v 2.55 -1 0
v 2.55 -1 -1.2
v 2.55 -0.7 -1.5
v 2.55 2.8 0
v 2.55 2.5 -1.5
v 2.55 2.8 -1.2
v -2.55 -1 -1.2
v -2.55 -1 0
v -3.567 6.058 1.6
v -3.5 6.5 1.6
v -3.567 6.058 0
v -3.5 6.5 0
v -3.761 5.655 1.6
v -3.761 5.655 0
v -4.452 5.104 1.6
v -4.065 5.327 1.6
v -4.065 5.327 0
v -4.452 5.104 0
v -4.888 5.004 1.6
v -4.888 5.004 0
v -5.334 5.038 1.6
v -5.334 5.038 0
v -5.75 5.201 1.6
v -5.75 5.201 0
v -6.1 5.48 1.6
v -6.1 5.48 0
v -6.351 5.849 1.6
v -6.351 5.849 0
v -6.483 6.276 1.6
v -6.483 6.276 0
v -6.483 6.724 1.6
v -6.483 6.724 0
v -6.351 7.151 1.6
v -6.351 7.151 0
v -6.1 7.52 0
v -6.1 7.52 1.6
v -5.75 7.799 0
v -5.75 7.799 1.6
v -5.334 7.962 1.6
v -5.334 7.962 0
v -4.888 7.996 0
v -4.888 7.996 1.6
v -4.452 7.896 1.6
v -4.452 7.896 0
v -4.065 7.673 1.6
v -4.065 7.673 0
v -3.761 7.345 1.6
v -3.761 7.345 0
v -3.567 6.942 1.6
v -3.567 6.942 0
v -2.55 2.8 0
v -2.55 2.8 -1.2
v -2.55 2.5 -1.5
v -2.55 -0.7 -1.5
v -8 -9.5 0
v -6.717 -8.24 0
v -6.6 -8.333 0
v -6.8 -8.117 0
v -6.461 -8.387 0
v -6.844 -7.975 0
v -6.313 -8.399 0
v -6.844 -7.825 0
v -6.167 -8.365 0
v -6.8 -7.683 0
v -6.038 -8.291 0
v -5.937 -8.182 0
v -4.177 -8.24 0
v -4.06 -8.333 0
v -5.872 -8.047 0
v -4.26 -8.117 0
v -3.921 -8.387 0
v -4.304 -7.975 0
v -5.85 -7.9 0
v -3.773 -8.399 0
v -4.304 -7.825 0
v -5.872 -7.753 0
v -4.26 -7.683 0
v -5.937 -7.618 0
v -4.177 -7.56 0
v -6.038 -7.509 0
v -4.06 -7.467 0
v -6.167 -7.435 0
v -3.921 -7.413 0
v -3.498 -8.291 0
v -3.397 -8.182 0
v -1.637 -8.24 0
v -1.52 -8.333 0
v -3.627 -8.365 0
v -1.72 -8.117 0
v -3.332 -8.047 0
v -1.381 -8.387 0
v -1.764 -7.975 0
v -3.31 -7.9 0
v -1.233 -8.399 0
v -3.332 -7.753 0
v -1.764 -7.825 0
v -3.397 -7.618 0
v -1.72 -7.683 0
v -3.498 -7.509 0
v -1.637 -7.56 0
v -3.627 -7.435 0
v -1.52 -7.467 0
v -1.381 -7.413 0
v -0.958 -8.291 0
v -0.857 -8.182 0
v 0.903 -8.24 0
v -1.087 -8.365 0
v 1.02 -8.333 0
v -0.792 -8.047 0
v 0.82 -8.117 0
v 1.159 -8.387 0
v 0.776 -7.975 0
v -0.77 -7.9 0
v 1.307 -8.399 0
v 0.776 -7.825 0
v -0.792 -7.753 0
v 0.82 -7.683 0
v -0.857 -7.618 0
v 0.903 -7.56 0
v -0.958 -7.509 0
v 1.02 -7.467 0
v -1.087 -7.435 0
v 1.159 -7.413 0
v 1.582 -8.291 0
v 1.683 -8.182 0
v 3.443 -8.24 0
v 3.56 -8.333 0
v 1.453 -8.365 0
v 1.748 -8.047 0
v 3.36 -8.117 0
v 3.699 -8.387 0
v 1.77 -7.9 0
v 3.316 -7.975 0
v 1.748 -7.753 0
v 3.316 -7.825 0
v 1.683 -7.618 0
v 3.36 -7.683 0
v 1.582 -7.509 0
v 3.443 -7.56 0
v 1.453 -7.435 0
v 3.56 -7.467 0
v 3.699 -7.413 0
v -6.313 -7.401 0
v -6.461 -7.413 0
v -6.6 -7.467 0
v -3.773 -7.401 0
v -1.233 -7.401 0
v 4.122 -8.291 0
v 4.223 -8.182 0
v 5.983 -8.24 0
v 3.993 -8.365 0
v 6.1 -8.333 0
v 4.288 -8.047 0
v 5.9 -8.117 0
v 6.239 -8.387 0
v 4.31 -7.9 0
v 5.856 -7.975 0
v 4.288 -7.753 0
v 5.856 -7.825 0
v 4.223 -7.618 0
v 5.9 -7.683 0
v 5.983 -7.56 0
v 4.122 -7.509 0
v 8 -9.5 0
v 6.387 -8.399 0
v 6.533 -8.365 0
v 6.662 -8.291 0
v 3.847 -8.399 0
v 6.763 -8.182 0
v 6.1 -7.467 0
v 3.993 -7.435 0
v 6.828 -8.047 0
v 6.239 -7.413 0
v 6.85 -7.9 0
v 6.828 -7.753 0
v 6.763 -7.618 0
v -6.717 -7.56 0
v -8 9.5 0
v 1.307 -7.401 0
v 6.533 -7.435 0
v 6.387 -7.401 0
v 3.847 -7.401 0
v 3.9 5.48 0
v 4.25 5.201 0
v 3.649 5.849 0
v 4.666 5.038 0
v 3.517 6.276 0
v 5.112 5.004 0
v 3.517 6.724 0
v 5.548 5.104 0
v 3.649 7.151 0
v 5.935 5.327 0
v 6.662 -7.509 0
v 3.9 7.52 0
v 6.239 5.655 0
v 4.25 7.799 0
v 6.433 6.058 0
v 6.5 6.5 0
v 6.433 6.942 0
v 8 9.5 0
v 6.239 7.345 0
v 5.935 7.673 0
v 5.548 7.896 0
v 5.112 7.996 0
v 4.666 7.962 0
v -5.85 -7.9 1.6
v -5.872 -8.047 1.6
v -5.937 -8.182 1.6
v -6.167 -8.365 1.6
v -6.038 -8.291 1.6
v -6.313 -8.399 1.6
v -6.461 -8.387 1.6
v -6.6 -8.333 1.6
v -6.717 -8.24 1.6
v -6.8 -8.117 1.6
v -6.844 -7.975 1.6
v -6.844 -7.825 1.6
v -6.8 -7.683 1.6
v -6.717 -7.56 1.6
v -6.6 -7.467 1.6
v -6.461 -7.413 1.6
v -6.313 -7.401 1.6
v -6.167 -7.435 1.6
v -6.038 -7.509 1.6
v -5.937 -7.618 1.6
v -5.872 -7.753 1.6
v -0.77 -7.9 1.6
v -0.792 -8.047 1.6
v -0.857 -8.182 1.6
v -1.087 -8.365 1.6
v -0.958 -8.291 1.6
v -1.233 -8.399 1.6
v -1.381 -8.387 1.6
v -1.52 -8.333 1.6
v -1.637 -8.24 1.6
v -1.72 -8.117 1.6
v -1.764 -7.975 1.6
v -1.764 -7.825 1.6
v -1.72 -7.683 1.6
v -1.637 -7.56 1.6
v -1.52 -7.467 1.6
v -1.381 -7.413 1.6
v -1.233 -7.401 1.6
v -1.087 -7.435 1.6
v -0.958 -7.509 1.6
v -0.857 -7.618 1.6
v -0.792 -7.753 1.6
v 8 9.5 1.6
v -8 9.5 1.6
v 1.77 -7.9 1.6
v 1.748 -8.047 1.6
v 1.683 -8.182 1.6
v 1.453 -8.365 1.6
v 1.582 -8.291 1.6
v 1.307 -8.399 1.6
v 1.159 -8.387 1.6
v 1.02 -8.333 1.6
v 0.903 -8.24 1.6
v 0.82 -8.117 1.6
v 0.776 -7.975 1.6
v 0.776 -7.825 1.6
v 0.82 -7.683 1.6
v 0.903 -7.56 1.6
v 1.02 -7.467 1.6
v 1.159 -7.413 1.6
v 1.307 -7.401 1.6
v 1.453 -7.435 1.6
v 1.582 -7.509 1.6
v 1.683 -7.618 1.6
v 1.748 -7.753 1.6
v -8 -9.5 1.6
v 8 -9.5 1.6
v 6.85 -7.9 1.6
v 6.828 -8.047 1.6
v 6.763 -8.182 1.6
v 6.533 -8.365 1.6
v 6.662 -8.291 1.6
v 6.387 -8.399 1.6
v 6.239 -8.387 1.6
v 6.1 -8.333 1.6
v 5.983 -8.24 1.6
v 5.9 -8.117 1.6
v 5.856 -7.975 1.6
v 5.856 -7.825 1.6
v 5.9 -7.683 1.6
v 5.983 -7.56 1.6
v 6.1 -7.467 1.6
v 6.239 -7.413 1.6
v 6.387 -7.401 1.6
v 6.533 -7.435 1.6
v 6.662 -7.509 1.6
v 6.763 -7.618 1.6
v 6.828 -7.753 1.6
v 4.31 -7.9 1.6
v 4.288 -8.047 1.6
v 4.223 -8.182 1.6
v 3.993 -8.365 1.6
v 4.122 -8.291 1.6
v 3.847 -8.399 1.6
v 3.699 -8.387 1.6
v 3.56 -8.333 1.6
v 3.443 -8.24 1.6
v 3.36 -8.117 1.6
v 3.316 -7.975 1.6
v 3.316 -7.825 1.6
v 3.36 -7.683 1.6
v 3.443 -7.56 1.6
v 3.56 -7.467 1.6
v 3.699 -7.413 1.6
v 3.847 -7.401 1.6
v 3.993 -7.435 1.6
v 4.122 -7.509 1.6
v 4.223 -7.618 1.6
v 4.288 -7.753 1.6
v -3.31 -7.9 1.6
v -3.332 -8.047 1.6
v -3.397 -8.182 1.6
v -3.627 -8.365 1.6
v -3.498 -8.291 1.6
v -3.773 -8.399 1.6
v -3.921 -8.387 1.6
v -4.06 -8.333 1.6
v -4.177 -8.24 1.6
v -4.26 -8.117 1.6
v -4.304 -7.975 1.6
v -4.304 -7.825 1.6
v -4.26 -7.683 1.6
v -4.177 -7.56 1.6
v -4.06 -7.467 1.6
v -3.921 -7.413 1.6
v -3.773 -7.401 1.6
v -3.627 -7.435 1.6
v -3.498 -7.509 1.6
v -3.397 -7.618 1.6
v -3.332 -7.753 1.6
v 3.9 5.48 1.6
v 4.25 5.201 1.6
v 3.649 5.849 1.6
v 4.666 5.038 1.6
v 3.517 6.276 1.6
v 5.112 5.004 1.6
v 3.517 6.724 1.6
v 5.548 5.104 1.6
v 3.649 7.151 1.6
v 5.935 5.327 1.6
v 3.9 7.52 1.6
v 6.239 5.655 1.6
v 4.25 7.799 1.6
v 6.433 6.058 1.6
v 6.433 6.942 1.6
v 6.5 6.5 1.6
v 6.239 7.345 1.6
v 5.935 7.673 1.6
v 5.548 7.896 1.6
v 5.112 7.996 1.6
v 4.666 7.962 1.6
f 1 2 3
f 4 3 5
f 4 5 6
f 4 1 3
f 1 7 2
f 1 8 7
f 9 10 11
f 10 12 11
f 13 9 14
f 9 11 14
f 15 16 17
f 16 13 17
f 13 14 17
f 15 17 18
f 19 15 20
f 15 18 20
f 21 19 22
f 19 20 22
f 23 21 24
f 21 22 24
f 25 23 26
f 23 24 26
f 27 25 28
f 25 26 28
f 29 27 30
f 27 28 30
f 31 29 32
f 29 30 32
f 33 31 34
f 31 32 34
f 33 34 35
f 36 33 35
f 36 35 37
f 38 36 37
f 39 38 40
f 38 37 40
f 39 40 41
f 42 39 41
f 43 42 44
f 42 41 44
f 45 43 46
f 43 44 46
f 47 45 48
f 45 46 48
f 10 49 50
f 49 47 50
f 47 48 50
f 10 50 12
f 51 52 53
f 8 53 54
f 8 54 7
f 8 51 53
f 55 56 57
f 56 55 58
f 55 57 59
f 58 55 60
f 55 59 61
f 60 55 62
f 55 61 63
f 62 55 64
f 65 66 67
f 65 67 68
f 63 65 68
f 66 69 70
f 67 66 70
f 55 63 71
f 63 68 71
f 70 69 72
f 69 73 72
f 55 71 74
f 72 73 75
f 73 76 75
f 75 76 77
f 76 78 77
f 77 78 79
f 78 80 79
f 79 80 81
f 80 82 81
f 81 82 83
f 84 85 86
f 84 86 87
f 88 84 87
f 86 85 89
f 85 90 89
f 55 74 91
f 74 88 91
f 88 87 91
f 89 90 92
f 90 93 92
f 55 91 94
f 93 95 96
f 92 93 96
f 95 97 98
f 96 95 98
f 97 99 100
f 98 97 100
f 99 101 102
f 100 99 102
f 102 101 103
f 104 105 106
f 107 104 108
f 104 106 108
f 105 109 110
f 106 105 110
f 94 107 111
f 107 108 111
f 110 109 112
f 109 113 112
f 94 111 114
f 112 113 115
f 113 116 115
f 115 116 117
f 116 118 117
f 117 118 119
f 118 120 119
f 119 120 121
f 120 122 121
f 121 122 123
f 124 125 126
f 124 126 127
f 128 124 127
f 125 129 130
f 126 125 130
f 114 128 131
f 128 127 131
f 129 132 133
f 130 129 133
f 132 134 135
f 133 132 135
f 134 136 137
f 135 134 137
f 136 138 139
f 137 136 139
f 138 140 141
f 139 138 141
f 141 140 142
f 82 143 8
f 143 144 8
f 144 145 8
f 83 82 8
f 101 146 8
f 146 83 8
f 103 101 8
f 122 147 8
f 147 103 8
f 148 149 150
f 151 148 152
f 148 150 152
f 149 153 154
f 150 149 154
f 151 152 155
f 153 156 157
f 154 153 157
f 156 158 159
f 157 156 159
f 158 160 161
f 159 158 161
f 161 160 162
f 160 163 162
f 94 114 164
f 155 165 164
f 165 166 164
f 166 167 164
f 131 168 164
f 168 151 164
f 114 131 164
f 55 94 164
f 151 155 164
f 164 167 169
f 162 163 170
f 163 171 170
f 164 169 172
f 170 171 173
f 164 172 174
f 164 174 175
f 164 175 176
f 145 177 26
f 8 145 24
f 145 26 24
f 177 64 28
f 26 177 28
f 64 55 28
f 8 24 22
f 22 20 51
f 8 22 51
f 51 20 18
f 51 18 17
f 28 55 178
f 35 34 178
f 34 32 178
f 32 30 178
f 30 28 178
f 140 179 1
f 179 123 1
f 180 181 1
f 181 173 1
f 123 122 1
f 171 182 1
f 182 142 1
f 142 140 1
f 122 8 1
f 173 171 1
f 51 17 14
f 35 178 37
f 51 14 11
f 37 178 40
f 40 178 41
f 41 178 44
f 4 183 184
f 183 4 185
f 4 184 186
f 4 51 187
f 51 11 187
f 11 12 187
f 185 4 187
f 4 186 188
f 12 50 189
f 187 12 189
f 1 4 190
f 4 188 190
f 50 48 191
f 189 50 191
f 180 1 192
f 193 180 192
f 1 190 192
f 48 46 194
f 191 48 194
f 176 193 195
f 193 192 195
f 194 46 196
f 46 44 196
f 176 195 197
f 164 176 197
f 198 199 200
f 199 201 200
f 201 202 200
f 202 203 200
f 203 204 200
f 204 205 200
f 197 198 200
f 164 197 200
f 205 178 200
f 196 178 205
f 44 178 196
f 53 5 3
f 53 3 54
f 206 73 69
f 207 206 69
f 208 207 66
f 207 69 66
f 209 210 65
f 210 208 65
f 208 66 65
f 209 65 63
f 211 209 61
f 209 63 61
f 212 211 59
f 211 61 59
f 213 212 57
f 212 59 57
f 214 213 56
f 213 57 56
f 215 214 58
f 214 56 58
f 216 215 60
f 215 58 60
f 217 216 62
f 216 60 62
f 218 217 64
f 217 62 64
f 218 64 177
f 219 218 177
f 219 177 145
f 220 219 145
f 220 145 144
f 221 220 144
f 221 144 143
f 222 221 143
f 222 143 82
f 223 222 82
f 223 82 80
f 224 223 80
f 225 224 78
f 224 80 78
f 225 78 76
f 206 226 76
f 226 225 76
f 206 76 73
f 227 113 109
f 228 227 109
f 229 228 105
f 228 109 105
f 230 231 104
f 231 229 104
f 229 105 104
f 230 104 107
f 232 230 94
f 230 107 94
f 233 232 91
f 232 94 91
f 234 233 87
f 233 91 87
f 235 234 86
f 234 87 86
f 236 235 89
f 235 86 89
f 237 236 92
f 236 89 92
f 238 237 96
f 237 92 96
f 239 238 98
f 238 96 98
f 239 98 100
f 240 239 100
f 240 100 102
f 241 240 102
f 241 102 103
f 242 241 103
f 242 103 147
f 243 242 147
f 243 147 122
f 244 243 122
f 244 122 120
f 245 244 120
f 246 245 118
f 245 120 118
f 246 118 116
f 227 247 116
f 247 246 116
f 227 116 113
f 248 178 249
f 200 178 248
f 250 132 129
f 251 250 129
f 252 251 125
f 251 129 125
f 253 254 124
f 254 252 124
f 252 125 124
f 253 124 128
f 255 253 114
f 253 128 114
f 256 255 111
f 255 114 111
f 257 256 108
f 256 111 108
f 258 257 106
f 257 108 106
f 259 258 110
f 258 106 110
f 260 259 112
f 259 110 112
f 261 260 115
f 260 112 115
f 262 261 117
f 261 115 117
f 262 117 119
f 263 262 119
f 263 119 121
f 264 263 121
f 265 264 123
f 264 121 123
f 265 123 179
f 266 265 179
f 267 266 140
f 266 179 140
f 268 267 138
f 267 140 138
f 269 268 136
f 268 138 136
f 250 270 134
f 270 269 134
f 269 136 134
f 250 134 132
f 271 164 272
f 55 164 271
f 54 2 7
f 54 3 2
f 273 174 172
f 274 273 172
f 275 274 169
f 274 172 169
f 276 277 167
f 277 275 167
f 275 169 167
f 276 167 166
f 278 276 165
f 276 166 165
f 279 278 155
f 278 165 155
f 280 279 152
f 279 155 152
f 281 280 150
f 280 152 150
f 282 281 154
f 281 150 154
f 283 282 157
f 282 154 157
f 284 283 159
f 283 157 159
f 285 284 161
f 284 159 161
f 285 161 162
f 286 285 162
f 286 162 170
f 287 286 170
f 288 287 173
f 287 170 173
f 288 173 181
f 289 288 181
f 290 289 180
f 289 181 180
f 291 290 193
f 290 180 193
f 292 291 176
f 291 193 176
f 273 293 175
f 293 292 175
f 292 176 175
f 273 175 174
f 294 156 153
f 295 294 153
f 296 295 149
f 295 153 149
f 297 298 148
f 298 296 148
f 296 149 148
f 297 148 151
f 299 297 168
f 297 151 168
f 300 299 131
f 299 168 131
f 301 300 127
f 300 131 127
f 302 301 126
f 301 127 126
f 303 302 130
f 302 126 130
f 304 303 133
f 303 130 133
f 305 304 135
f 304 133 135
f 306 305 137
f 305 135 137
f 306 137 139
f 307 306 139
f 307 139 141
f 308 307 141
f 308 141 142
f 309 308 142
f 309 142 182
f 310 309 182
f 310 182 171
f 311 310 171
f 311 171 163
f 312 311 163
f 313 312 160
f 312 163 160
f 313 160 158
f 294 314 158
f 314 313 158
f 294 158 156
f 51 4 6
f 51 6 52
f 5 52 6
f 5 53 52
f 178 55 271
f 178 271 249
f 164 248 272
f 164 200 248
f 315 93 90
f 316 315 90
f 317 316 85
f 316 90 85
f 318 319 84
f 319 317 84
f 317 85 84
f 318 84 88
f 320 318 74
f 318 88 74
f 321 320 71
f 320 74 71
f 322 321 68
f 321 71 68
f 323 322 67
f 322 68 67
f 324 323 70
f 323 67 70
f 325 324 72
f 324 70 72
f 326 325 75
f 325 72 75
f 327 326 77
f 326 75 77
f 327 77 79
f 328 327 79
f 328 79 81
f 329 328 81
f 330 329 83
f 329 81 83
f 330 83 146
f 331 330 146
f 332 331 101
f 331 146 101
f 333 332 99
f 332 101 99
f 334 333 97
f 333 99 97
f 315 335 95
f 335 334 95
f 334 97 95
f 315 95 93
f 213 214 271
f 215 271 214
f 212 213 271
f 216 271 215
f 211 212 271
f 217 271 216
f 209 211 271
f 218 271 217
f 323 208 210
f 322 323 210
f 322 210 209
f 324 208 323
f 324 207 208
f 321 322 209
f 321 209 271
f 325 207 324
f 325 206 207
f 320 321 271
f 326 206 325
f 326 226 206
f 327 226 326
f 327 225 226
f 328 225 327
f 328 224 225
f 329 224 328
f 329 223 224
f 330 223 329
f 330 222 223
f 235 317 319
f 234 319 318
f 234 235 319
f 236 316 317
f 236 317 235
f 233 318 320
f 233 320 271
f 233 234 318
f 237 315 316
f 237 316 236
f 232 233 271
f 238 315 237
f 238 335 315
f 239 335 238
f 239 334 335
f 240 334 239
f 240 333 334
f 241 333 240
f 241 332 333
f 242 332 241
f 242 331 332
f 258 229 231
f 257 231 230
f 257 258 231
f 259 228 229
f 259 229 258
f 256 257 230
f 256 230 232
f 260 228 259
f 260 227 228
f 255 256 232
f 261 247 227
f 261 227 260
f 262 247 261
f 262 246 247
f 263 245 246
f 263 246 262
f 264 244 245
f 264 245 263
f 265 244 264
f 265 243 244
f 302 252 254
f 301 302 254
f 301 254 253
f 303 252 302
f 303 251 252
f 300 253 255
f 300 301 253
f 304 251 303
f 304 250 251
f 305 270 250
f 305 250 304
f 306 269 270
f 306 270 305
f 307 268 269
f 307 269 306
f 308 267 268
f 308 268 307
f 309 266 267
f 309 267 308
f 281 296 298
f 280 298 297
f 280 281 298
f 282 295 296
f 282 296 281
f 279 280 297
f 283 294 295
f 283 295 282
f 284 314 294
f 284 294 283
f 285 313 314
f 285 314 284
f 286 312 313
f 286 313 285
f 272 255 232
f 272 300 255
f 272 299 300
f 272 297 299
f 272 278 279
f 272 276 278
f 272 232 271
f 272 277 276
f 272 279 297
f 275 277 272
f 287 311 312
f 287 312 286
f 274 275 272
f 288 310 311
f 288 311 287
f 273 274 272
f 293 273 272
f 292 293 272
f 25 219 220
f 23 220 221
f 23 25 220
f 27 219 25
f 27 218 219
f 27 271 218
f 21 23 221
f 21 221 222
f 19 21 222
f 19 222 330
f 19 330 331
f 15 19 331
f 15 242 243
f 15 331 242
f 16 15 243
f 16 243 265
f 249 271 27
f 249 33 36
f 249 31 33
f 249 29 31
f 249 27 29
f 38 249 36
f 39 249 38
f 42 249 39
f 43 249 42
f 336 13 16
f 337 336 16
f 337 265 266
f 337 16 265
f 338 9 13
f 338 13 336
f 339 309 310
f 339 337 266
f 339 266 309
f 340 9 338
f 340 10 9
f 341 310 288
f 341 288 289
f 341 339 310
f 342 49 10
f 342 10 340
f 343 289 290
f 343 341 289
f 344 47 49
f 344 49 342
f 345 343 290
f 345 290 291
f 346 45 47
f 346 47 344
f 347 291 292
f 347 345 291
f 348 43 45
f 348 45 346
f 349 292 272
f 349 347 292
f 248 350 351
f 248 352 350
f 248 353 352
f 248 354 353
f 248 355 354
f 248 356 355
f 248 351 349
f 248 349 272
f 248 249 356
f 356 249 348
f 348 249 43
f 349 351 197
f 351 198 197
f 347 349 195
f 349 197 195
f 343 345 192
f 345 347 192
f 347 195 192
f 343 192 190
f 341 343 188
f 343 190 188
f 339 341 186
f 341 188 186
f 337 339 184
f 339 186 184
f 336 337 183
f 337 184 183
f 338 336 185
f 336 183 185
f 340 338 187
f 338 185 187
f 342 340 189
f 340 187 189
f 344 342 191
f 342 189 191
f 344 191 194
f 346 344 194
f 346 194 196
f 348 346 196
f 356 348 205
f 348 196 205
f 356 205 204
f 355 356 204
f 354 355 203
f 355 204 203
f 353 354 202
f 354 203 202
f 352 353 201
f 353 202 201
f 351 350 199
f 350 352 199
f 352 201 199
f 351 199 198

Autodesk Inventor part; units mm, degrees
ref_plane "YZ Plane" through (0, 0, 0) normal (1, 0, 0) x (0, 1, 0)
ref_plane "XZ Plane" through (0, 0, 0) normal (0, 1, 0) x (-1, 0, 0)
ref_plane "XY Plane" through (0, 0, 0) normal (0, 0, 1) x (1, 0, 0)
sketch "Sketch1" plane through (0, 0, 0) normal (0, 0, 1) x (1, 0, 0)
  line L0 (8, -9.5) -> (-8, -9.5)
  line L1 (-8, -9.5) -> (-8, 9.5)
  line L2 (-8, 9.5) -> (8, 9.5)
  line L3 (8, 9.5) -> (8, -9.5)
  line L4 (8, -9.5) -> (-8, 9.5) construction
  line L5 (-8, -9.5) -> (8, 9.5) construction
  circle A0 centre (-5, 6.5) radius 1.5
  circle A1 centre (5, 6.5) radius 1.5
  circle A2 centre (-6.35, -7.9) radius 0.5
  line L6 (0, 9.5) -> (0, -9.5) construction
  circle A3 centre (-3.81, -7.9) radius 0.5
  circle A4 centre (-1.27, -7.9) radius 0.5
  circle A5 centre (1.27, -7.9) radius 0.5
  circle A6 centre (3.81, -7.9) radius 0.5
  circle A7 centre (6.35, -7.9) radius 0.5
  point P0 (0, 0)
  dimension "d0" = 16
  dimension "d1" = 19
  dimension "d3" = 3
  dimension "d4" = 1
  dimension "d5" = 3
  dimension "d6" = 3
  dimension "d7" = 1.6
  dimension "d10" = 2.54
extrude "Extrusion1" add sketch "Sketch1" along normal blind 1.6
sketch "Sketch2" plane through (0, 0, 0) normal (0, 0, -1) x (-1, 0, 0)
  line L0 (2.55, -1) -> (-2.55, -1)
  line L1 (-2.55, -1) -> (-2.55, 2.8)
  line L2 (-2.55, 2.8) -> (2.55, 2.8)
  line L3 (2.55, 2.8) -> (2.55, -1)
  line L4 (2.55, -1) -> (-2.55, 2.8) construction
  line L5 (-2.55, -1) -> (2.55, 2.8) construction
  line L6 (-8, 9.5) -> (8, 9.5) projected
  point P0 (0, 0)
  point P1 (0, 0.9)
  point P2 (0, 0.9)
  dimension "d17" = 5.1
  dimension "d18" = 3.8
  dimension "d19" = 10.5
extrude "Extrusion2" add sketch "Sketch2" along normal blind 1.5
chamfer "Chamfer1" distance 0.3 angle 45 2 edges at (0, -1, -1.5) (0, 2.8, -1.5)
sketch "Sketch3" plane through (0, 0, 0) normal (0, 0, -1) x (-1, 0, 0)
  line L0 (-8.0252, -9.5) -> (-8.0252, 9.5) construction
  line L1 (-8.0252, 9.5) -> (7.8645, 9.5) construction
  line L2 (7.8645, 9.5) -> (7.8645, -9.5) construction
  line L3 (7.8645, -9.5) -> (-8.0252, -9.5) construction
  line L4 (8, -9.5) -> (-8, -9.5) projected
  line L5 (-8, 9.5) -> (8, 9.5) projected
  point P0 (0, 0)
properties part number "CAN_transceiver"
